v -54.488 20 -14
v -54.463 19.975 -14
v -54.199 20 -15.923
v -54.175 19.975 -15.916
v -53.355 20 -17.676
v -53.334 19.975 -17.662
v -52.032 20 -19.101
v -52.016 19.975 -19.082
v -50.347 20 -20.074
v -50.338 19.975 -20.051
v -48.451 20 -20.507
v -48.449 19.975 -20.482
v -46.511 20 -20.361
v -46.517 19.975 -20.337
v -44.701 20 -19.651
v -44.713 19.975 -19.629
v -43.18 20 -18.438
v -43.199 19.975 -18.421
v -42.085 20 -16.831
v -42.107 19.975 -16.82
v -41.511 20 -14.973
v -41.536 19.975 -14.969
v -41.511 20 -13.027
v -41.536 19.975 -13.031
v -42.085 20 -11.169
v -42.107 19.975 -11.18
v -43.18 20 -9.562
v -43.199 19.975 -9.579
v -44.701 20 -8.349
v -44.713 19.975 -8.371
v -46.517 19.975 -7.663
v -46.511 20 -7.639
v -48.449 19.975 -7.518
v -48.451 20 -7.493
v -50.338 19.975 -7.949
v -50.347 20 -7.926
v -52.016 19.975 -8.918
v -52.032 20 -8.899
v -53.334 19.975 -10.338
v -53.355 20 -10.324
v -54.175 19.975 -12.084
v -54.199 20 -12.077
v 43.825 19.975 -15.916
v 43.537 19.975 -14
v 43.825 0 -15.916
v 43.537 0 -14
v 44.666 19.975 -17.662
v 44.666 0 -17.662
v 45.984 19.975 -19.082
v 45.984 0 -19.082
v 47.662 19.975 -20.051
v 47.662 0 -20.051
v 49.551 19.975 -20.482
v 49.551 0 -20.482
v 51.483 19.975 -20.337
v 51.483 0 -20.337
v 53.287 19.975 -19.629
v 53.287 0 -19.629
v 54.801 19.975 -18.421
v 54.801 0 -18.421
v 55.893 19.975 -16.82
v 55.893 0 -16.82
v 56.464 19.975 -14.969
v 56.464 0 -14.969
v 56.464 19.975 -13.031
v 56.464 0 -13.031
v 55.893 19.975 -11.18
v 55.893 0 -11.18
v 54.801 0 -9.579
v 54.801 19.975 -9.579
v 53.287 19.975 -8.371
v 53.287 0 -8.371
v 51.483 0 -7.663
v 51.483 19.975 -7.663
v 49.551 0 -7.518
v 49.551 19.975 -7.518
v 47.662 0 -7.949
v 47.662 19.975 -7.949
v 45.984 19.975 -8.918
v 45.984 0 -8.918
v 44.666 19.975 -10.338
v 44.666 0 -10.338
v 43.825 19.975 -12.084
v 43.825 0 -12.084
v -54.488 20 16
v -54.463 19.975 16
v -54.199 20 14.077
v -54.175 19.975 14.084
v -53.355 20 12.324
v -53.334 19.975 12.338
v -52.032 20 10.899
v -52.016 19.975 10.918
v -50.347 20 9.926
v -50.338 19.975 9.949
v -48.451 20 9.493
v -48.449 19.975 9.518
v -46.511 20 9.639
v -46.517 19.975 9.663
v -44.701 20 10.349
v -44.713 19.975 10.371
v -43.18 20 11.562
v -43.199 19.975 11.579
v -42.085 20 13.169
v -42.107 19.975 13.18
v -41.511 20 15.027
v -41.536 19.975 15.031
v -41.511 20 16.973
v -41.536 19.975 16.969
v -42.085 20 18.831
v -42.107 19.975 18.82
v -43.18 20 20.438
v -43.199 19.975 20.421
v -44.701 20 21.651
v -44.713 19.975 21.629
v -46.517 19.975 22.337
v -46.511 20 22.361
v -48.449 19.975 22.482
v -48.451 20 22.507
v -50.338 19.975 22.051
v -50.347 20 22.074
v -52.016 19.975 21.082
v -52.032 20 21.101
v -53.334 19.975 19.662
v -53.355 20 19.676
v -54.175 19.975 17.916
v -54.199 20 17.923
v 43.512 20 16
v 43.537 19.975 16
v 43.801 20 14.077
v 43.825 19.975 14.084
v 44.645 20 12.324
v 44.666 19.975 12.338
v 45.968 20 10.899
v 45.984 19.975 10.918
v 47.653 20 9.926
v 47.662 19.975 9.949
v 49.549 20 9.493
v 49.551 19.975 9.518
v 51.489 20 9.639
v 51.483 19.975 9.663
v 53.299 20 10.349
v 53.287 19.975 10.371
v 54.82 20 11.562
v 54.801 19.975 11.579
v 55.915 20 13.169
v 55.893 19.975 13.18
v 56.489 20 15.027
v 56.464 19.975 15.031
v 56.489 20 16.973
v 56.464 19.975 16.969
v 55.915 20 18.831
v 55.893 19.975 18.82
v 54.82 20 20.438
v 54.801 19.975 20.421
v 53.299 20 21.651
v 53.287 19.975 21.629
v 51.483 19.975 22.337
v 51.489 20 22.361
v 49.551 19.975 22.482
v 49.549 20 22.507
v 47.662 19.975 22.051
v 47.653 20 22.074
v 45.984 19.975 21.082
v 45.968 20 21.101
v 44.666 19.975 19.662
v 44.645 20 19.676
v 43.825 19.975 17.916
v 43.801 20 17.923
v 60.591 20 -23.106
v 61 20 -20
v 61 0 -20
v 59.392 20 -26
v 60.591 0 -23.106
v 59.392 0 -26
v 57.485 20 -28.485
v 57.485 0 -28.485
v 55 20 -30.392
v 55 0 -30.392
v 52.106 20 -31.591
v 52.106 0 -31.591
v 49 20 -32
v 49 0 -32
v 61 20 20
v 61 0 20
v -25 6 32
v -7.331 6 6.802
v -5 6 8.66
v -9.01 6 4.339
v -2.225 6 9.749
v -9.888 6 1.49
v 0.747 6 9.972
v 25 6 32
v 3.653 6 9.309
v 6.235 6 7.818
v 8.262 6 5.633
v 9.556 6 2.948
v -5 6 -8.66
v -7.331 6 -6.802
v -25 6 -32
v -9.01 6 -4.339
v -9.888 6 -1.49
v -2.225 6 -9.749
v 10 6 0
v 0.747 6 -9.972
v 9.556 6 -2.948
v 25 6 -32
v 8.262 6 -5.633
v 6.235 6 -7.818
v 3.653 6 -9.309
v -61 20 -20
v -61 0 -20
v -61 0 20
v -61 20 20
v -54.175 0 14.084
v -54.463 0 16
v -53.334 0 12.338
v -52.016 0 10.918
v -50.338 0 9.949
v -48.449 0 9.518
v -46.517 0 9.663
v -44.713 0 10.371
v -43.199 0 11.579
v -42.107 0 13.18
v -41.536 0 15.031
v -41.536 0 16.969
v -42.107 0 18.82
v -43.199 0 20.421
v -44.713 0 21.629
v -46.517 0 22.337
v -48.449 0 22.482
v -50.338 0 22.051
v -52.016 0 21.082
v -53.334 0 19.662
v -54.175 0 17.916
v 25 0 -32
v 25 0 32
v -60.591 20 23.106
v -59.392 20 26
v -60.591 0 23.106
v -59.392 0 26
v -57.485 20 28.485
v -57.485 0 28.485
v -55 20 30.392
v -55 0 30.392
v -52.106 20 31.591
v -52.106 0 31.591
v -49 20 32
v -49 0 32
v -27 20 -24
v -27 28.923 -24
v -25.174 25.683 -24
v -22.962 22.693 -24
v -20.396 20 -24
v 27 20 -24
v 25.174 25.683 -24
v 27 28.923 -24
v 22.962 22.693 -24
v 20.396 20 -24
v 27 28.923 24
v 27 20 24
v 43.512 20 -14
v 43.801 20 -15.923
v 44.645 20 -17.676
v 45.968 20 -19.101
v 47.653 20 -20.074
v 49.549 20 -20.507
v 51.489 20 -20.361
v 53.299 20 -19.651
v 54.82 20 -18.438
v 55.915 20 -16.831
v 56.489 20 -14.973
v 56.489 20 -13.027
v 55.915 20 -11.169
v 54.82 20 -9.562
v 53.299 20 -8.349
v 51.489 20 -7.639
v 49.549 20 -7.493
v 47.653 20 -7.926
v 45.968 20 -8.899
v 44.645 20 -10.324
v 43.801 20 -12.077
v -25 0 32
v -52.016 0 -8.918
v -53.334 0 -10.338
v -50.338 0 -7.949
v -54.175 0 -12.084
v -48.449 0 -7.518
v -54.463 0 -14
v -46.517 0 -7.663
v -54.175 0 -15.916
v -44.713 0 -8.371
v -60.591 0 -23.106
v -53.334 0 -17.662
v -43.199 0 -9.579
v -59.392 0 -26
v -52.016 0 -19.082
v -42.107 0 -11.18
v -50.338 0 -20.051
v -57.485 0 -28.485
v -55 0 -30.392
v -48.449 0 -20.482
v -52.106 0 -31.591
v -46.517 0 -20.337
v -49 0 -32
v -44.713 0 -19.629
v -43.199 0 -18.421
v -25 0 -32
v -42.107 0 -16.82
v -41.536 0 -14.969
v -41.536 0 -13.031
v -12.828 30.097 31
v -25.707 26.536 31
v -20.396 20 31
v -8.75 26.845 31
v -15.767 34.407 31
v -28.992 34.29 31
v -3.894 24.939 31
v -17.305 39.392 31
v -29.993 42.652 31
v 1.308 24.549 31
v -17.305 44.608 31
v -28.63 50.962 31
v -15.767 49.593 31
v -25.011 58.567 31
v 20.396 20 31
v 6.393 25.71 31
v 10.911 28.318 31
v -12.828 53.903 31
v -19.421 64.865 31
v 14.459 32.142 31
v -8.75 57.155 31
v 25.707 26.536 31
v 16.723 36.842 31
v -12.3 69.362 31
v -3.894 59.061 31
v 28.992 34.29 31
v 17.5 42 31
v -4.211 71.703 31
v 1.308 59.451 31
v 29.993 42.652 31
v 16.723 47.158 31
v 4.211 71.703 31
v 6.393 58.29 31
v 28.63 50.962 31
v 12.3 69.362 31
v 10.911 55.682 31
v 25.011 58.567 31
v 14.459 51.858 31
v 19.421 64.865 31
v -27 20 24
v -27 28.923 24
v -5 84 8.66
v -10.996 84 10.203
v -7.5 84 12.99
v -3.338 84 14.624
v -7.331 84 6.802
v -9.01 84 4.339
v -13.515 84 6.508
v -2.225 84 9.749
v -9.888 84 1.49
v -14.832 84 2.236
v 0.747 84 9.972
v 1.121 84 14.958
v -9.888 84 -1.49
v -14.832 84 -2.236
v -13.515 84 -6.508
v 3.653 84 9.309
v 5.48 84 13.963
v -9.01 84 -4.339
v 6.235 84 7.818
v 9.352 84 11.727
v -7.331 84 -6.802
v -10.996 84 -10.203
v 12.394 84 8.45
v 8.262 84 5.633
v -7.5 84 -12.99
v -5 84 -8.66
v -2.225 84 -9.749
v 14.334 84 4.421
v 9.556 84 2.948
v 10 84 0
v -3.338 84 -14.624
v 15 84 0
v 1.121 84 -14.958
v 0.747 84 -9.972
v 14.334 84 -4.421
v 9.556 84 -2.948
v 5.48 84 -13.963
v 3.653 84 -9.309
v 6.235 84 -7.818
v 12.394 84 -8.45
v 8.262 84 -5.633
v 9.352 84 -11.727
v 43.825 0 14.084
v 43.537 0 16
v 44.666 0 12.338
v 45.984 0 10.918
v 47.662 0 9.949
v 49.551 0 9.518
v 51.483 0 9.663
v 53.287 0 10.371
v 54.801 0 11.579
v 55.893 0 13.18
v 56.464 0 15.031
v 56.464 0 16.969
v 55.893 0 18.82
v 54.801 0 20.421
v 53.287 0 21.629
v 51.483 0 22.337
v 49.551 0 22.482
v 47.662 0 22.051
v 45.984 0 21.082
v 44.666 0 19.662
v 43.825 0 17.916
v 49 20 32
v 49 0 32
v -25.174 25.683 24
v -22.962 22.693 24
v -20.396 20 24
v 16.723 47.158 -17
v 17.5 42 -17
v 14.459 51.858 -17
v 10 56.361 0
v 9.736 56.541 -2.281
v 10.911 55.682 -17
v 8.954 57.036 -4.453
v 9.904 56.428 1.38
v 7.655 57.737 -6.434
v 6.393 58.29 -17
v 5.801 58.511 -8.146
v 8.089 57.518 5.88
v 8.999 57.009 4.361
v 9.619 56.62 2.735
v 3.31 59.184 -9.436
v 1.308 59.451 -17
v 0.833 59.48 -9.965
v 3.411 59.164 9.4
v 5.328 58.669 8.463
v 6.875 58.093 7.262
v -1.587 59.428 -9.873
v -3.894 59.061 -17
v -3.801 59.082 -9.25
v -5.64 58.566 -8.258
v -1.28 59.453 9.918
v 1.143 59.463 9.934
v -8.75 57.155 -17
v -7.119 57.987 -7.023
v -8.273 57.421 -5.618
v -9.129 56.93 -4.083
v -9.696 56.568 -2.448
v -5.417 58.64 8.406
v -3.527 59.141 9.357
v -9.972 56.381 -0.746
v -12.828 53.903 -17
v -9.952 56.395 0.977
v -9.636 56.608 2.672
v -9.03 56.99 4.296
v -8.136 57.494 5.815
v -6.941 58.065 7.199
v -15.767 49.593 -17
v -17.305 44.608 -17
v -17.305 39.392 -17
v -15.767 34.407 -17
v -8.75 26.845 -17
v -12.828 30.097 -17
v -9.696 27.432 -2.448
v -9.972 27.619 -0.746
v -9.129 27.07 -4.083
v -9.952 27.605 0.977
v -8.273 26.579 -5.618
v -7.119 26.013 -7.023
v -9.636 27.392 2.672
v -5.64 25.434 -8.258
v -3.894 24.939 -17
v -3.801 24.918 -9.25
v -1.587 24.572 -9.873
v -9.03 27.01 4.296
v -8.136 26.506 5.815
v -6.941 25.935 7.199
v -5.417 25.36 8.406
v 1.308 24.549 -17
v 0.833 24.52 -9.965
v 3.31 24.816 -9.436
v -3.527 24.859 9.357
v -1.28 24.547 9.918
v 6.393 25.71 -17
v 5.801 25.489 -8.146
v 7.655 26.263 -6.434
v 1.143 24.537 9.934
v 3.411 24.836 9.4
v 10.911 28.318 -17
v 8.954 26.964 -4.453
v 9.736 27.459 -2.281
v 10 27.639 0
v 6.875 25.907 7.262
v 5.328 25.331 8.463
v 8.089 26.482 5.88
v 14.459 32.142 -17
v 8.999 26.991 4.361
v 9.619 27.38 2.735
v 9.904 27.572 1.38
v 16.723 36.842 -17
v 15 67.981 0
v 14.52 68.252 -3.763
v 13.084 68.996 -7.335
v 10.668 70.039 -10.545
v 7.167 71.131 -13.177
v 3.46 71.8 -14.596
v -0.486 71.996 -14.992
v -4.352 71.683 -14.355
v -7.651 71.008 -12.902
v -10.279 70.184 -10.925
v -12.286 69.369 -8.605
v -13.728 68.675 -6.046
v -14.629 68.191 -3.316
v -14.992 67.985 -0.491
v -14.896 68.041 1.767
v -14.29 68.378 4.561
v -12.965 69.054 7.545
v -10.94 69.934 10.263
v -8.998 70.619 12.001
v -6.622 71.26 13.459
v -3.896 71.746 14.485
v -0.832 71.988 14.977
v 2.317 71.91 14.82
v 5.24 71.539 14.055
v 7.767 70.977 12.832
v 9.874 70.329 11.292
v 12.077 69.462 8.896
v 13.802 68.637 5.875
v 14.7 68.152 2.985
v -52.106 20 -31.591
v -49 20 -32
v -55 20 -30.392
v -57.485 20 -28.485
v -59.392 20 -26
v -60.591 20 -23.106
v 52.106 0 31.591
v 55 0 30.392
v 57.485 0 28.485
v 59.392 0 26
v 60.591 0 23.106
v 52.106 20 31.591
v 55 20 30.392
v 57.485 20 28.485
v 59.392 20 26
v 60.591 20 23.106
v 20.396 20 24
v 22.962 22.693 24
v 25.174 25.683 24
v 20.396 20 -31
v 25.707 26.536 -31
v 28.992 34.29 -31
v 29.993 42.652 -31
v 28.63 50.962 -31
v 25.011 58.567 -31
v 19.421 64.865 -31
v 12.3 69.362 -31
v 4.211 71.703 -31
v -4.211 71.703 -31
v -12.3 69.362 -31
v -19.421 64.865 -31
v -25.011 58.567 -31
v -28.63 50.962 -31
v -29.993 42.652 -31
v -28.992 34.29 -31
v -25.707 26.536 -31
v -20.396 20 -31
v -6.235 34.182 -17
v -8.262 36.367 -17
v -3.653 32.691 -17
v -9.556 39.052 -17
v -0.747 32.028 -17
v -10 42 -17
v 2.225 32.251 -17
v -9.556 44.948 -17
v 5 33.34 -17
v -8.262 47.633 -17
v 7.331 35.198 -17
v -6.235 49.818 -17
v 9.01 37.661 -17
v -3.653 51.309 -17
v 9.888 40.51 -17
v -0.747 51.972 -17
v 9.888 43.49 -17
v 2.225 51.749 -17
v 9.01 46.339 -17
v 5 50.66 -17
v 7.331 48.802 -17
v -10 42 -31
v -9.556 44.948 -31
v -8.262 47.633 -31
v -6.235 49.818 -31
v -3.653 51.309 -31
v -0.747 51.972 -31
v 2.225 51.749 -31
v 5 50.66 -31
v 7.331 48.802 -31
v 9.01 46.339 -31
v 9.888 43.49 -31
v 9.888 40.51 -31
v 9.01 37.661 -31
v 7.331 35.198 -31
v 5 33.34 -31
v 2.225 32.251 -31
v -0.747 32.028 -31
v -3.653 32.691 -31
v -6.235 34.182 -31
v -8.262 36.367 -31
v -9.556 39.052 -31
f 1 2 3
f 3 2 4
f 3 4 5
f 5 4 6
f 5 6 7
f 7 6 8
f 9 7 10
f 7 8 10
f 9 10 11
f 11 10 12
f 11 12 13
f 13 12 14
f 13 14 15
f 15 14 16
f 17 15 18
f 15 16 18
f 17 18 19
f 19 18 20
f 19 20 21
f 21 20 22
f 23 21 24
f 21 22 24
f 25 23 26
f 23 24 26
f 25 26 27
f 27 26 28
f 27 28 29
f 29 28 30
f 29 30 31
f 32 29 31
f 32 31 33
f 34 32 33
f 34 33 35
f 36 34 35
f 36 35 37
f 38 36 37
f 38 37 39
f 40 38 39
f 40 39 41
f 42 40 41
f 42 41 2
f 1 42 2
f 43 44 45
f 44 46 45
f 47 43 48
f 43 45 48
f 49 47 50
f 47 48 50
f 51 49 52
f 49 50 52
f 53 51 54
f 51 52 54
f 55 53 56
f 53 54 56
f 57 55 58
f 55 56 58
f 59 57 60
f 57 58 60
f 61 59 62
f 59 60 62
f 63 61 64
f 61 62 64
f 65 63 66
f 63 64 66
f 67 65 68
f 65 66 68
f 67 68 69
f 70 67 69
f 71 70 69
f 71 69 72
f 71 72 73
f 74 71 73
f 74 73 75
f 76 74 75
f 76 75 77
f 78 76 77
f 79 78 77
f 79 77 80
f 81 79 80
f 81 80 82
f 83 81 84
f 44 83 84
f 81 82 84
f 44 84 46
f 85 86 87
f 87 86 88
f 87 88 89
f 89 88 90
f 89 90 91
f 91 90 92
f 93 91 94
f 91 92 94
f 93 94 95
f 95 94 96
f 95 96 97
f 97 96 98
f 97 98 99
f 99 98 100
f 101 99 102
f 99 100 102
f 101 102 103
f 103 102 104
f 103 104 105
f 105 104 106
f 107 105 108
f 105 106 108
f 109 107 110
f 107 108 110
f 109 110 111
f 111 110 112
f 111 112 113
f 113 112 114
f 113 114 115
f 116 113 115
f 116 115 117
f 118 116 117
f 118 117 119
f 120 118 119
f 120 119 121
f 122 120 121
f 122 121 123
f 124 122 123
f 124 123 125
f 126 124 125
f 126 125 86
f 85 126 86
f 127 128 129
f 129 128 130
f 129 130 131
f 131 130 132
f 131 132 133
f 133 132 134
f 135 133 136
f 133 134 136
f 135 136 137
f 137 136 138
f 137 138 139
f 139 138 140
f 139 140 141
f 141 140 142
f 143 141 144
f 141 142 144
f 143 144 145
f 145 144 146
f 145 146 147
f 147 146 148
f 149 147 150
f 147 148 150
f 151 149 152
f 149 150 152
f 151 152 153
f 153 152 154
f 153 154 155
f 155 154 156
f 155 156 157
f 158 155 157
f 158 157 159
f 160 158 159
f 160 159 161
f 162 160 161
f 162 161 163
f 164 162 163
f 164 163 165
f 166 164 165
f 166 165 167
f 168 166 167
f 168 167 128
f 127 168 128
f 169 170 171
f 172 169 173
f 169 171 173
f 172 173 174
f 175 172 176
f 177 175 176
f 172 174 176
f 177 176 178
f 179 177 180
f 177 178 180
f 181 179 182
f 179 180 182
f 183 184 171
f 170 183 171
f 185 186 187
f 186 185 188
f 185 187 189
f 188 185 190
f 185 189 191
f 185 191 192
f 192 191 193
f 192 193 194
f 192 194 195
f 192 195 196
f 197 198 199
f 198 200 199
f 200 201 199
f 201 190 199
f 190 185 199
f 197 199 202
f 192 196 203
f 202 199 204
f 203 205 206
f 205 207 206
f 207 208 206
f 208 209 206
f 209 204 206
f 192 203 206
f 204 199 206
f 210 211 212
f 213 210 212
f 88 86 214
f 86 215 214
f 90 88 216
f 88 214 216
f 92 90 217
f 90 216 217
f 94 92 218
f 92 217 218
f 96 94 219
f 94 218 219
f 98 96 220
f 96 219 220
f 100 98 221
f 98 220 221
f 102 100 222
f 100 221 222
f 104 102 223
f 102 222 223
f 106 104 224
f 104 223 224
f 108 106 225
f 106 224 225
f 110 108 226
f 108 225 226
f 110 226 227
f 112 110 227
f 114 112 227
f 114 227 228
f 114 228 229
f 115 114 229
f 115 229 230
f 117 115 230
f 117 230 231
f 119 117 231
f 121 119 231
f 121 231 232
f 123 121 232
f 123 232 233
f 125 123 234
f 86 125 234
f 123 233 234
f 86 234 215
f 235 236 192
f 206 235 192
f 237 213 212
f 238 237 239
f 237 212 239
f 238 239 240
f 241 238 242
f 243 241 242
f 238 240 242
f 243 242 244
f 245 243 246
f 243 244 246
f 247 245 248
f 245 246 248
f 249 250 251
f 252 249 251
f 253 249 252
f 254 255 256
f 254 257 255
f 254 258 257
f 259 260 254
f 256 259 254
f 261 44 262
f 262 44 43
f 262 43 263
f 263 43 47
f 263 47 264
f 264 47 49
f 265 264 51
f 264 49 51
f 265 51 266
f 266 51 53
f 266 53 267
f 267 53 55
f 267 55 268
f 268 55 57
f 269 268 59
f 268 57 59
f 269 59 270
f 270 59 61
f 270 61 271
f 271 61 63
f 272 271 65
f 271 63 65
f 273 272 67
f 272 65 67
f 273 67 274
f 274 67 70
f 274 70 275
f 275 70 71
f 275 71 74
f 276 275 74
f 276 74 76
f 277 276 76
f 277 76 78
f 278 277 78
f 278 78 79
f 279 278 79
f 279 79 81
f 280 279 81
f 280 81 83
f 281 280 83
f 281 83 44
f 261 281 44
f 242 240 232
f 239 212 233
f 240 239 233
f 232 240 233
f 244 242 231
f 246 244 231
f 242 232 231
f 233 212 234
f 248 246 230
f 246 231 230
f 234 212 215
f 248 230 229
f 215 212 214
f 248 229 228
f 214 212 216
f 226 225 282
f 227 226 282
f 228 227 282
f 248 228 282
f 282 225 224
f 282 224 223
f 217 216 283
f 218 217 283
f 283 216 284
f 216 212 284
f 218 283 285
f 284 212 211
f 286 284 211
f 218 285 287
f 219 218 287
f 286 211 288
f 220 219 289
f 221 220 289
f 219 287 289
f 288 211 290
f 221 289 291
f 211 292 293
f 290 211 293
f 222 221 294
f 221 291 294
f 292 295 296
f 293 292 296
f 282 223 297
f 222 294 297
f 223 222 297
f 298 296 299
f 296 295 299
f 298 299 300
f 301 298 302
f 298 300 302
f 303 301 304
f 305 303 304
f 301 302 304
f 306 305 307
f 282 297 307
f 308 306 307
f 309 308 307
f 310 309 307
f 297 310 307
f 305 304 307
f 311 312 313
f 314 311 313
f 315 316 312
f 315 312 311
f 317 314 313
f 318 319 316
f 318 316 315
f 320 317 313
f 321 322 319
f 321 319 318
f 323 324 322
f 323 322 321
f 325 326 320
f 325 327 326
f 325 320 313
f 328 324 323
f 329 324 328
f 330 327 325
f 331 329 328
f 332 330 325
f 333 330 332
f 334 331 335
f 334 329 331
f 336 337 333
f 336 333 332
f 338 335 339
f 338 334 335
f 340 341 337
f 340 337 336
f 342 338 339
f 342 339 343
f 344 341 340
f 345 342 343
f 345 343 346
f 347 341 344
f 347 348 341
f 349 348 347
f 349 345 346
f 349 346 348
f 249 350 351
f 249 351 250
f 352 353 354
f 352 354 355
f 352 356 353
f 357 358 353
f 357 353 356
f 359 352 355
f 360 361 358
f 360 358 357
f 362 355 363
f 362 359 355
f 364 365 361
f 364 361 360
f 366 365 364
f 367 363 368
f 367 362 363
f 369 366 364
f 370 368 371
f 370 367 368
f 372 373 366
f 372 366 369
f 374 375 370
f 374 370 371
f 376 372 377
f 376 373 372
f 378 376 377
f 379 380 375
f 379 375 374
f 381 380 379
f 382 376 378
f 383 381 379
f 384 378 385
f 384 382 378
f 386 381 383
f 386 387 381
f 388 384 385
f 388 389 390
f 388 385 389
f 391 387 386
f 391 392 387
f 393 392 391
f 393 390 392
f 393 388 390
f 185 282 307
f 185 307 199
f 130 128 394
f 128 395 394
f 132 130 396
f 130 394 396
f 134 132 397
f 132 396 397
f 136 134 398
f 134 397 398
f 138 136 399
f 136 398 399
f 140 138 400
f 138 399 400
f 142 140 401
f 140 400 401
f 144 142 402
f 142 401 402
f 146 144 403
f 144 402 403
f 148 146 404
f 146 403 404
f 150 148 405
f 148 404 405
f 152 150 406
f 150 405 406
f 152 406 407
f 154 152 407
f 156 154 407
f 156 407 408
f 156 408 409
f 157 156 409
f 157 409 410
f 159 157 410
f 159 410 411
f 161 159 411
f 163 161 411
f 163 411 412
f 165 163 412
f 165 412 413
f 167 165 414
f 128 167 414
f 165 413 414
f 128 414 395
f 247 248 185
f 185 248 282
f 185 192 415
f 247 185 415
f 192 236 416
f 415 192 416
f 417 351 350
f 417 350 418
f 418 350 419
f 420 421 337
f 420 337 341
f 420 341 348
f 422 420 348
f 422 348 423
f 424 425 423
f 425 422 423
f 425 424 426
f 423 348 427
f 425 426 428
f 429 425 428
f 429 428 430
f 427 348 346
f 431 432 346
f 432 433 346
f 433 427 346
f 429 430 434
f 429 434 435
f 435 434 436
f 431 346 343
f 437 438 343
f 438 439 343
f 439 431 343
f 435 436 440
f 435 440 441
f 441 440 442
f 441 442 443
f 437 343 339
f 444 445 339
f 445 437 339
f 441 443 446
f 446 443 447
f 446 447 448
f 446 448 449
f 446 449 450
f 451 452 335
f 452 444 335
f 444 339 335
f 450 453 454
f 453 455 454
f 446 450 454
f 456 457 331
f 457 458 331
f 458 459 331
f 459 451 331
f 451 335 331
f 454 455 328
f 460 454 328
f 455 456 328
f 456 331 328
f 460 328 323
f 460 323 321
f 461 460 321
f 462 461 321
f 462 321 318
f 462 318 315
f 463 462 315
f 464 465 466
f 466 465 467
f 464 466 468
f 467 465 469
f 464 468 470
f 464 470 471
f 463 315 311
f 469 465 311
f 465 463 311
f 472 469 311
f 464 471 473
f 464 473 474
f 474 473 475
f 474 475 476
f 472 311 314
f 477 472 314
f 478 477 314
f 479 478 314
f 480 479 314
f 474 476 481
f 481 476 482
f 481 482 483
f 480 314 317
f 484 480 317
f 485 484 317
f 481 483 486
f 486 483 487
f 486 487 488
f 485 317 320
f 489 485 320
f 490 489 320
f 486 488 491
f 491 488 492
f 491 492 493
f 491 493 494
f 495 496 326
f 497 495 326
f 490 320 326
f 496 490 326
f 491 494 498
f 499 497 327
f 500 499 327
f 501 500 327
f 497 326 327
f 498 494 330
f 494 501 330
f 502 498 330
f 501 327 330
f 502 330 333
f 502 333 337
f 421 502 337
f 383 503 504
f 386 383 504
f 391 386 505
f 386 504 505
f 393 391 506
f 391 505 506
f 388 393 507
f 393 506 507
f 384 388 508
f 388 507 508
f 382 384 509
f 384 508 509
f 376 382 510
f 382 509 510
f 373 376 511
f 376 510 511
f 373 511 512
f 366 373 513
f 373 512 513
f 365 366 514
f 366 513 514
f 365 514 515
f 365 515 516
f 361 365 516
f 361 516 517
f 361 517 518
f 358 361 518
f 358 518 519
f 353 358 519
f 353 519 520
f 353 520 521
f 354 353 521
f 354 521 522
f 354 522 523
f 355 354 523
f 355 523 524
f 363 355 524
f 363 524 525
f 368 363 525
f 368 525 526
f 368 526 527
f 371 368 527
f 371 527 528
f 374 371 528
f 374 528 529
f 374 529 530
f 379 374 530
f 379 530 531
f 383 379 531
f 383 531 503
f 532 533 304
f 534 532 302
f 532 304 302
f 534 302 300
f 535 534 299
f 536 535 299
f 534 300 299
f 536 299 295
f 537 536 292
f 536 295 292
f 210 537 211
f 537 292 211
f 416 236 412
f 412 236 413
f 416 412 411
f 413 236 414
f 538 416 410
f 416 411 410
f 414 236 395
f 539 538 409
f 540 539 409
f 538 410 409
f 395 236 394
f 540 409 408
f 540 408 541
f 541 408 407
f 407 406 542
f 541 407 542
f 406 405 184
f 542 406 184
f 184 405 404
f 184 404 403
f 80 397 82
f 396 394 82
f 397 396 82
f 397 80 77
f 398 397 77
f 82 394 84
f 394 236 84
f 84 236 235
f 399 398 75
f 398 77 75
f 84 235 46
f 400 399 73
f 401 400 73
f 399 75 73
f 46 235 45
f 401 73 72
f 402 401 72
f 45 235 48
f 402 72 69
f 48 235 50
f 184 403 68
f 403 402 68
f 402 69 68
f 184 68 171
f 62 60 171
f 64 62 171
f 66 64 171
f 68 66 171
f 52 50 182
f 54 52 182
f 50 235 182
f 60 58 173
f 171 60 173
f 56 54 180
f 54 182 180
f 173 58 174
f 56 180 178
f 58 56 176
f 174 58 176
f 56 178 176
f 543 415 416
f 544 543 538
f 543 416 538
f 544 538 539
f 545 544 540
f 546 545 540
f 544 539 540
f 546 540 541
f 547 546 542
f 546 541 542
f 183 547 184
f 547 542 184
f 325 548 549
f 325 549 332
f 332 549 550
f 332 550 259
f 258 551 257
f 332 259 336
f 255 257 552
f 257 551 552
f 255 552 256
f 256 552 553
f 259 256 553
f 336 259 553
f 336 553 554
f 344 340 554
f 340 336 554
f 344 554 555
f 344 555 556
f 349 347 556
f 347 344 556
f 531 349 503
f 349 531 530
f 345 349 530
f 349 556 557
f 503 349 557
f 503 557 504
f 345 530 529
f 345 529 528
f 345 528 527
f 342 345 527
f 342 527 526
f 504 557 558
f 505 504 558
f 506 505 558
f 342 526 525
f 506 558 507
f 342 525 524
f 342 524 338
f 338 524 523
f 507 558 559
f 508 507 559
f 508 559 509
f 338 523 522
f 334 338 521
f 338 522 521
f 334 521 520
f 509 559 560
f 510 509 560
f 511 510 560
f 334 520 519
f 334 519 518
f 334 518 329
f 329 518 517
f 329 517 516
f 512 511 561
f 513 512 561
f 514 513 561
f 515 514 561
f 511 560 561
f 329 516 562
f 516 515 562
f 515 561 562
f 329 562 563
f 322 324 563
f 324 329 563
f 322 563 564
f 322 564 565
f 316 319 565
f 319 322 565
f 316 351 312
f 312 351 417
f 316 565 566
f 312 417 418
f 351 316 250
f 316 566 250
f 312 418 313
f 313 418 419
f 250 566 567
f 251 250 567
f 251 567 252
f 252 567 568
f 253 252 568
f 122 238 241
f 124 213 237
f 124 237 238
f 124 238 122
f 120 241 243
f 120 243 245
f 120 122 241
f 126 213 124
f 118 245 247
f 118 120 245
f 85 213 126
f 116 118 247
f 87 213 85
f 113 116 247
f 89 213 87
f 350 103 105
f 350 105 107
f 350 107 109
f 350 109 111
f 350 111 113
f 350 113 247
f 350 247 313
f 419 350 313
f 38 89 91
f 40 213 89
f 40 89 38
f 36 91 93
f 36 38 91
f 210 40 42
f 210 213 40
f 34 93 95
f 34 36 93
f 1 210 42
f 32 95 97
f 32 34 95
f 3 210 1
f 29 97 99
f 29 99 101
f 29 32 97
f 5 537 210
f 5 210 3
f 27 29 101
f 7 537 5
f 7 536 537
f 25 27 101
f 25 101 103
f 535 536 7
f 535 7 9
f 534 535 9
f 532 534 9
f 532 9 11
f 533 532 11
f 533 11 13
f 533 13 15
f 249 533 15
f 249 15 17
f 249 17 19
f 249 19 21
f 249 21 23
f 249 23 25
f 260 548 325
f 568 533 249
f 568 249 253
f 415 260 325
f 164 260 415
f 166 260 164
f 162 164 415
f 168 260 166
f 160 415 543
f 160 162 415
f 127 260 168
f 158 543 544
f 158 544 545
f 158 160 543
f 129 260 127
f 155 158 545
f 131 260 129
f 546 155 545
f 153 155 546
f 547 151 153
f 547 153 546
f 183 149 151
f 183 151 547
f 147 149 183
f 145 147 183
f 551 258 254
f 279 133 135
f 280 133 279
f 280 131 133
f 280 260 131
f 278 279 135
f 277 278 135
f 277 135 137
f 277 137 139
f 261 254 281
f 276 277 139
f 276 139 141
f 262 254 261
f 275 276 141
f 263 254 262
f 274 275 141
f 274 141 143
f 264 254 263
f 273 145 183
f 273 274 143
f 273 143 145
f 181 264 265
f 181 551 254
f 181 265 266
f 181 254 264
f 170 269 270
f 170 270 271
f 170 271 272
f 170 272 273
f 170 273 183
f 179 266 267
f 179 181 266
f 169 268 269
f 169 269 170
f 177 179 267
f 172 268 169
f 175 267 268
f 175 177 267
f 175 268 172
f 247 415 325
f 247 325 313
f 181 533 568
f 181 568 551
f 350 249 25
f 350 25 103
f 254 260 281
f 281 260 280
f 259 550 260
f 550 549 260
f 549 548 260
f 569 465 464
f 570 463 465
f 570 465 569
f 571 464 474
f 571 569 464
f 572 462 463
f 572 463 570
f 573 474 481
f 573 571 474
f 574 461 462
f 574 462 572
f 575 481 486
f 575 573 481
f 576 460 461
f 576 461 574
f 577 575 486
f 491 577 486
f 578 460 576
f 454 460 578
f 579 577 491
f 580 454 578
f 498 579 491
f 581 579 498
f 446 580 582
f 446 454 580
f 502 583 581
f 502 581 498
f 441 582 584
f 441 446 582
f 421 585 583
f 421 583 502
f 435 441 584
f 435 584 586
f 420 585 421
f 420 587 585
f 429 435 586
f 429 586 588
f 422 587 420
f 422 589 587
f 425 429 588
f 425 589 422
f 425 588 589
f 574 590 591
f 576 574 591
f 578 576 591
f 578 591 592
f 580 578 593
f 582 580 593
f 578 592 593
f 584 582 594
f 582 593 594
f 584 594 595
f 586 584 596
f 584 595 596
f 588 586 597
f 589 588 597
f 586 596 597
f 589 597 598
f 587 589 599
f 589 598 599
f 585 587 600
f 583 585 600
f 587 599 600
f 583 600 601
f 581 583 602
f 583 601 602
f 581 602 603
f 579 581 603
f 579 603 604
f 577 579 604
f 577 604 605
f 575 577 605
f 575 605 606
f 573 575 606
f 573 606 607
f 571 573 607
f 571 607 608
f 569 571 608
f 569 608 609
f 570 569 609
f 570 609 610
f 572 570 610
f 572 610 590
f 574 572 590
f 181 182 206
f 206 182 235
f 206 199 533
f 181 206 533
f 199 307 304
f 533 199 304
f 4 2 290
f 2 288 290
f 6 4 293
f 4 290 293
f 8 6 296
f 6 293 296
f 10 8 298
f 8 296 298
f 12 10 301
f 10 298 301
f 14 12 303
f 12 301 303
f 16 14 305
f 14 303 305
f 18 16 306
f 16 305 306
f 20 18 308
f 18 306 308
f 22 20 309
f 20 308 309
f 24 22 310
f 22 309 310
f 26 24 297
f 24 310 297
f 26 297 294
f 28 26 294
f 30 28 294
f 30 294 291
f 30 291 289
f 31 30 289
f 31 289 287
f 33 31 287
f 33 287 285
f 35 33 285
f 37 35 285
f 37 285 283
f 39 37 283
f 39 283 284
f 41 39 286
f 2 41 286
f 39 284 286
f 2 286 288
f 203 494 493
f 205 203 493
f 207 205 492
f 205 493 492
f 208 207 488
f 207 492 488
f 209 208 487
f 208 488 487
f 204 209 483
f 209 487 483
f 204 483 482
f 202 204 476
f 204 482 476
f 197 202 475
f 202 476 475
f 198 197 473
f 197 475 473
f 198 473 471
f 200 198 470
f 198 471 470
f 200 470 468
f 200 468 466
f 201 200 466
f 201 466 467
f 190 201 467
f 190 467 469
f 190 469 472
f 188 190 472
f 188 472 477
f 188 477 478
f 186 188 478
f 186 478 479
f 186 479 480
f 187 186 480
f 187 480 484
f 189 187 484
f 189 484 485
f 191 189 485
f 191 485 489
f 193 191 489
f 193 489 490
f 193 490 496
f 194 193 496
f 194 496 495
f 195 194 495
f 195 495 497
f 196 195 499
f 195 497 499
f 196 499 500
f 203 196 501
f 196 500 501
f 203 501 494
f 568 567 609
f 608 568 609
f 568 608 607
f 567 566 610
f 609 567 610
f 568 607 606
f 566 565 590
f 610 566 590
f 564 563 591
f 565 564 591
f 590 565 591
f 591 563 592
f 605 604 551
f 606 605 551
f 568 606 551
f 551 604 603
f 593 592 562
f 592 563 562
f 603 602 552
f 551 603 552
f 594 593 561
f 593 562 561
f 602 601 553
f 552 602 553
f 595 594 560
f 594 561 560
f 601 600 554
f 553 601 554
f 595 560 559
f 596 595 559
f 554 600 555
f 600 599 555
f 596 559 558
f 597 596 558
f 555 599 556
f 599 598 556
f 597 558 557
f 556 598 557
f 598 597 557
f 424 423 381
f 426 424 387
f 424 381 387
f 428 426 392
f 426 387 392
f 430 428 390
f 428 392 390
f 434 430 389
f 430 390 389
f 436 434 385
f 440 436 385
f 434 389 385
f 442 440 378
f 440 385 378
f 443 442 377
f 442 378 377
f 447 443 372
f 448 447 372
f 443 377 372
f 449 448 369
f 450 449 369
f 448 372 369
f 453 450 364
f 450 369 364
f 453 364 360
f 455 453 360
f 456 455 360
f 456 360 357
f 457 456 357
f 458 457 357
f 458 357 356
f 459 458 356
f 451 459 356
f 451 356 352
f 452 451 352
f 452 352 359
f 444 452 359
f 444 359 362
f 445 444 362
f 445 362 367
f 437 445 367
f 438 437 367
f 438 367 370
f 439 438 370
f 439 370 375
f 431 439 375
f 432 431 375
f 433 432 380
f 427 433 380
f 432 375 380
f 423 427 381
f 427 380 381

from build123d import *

# Parameters (mm, degrees)
EXTRUDE_12_DEPTH                  = 20
SKETCH_13_W                       = 54
SKETCH_13_H                       = 48
EXTRUDE_13_DEPTH                  = 22
EXTRUDE_START                     = -55
SKETCH_14_R                       = 30
EXTRUDE_14_DEPTH                  = 62
SKETCH_19_W                       = 50
SKETCH_19_H                       = 12
CUT_EXTRUDE_3_DEPTH               = 1
CUT_EXTRUDE_3_DEPTH_BACK          = 65
EXTRUDE_START_2                   = 6
SKETCH_20_R                       = 15
EXTRUDE_17_DEPTH                  = 78
SKETCH_21_R                       = 10
CUT_EXTRUDE_4_DEPTH               = 1.0000001
CUT_EXTRUDE_4_DEPTH_BACK          = 85
SKETCH_23_R                       = 17.5
CUT_EXTRUDE_7_DEPTH               = 48
SKETCH_25_R                       = 10
CUT_EXTRUDE_8_DEPTH               = 17
HOLE_WIZARD_13_0_13_2_D           = 13
HOLE_WIZARD_13_0_13_2_CSINK_D     = 13.05
HOLE_WIZARD_13_0_13_2_CSINK_ANGLE = 90


with BuildPart() as part:
    # Эскиз12 → Бобышка-Вытянуть12 (new body)
    with BuildSketch(Plane(origin=(0, 0, 0), x_dir=(1, 0, 0), z_dir=(0, 1, 0))):
        with BuildLine():
            Line((-49, -32), (49, -32))
            ThreePointArc((49, -32), (57.485281374, -28.485281374), (61, -20))
            Line((61, -20), (61, 20))
            ThreePointArc((61, 20), (57.485281374, 28.485281374), (49, 32))
            Line((49, 32), (-49, 32))
            ThreePointArc((-49, 32), (-57.485281374, 28.485281374), (-61, 20))
            Line((-61, 20), (-61, -20))
            ThreePointArc((-61, -20), (-57.485281374, -28.485281374), (-49, -32))
        make_face()
    extrude(amount=EXTRUDE_12_DEPTH)

    # Эскиз13 → Бобышка-Вытянуть13 (add)
    with BuildSketch(Plane(origin=(0, 20, 0), x_dir=(1, 0, 0), z_dir=(0, 1, 0))):
        Rectangle(SKETCH_13_W, SKETCH_13_H)
    extrude(amount=EXTRUDE_13_DEPTH)

    # Эскиз14 → Бобышка-Вытянуть14 (add)
    with BuildSketch(Plane.XY.offset(24).offset(EXTRUDE_START)):
        with Locations((0, 42)):
            Circle(SKETCH_14_R)
    extrude(amount=EXTRUDE_14_DEPTH)

    # Эскиз19 → Вырез-Вытянуть3 (cut, two sides)
    with BuildSketch(Plane.XY.offset(32)) as cut_extrude_3_sk:
        Rectangle(SKETCH_19_W, SKETCH_19_H)
    extrude(amount=CUT_EXTRUDE_3_DEPTH, mode=Mode.SUBTRACT)
    extrude(cut_extrude_3_sk.sketch, amount=-CUT_EXTRUDE_3_DEPTH_BACK, mode=Mode.SUBTRACT)

    # Эскиз20 → Бобышка-Вытянуть17 (add)
    with BuildSketch(Plane(origin=(0, 0, 0), x_dir=(1, 0, 0), z_dir=(0, 1, 0)).offset(EXTRUDE_START_2)):
        Circle(SKETCH_20_R)
    extrude(amount=EXTRUDE_17_DEPTH)

    # Эскиз21 → Вырез-Вытянуть4 (cut, two sides)
    with BuildSketch(Plane(origin=(0, 84, 0), x_dir=(1, 0, 0), z_dir=(0, 1, 0))) as cut_extrude_4_sk:
        Circle(SKETCH_21_R)
    extrude(amount=CUT_EXTRUDE_4_DEPTH, mode=Mode.SUBTRACT)
    extrude(cut_extrude_4_sk.sketch, amount=-CUT_EXTRUDE_4_DEPTH_BACK, mode=Mode.SUBTRACT)

    # Эскиз23 → Вырез-Вытянуть7 (cut)
    with BuildSketch(Plane.XY.offset(31)):
        with Locations((0, 42)):
            Circle(SKETCH_23_R)
    extrude(amount=-CUT_EXTRUDE_7_DEPTH, mode=Mode.SUBTRACT)

    # Эскиз25 → Вырез-Вытянуть8 (cut)
    with BuildSketch(Plane(origin=(0, 0, -31), x_dir=(-1, 0, 0), z_dir=(0, 0, -1))):
        with Locations((0, 42)):
            Circle(SKETCH_25_R)
    extrude(amount=-CUT_EXTRUDE_8_DEPTH, mode=Mode.SUBTRACT)

    # Диаметр отверстия Ø13.0 (13)2 (through all)
    with Locations(Plane(origin=(0, 20, 0), x_dir=(1, 0, 0), z_dir=(0, 1, 0))):
        with Locations((-47.963392627, 14), (-47.963392627, -16), (50.036607373, -16), (50.036607373, 14)):
            CounterSinkHole(HOLE_WIZARD_13_0_13_2_D / 2, HOLE_WIZARD_13_0_13_2_CSINK_D / 2, counter_sink_angle=HOLE_WIZARD_13_0_13_2_CSINK_ANGLE)


solid = part.part
